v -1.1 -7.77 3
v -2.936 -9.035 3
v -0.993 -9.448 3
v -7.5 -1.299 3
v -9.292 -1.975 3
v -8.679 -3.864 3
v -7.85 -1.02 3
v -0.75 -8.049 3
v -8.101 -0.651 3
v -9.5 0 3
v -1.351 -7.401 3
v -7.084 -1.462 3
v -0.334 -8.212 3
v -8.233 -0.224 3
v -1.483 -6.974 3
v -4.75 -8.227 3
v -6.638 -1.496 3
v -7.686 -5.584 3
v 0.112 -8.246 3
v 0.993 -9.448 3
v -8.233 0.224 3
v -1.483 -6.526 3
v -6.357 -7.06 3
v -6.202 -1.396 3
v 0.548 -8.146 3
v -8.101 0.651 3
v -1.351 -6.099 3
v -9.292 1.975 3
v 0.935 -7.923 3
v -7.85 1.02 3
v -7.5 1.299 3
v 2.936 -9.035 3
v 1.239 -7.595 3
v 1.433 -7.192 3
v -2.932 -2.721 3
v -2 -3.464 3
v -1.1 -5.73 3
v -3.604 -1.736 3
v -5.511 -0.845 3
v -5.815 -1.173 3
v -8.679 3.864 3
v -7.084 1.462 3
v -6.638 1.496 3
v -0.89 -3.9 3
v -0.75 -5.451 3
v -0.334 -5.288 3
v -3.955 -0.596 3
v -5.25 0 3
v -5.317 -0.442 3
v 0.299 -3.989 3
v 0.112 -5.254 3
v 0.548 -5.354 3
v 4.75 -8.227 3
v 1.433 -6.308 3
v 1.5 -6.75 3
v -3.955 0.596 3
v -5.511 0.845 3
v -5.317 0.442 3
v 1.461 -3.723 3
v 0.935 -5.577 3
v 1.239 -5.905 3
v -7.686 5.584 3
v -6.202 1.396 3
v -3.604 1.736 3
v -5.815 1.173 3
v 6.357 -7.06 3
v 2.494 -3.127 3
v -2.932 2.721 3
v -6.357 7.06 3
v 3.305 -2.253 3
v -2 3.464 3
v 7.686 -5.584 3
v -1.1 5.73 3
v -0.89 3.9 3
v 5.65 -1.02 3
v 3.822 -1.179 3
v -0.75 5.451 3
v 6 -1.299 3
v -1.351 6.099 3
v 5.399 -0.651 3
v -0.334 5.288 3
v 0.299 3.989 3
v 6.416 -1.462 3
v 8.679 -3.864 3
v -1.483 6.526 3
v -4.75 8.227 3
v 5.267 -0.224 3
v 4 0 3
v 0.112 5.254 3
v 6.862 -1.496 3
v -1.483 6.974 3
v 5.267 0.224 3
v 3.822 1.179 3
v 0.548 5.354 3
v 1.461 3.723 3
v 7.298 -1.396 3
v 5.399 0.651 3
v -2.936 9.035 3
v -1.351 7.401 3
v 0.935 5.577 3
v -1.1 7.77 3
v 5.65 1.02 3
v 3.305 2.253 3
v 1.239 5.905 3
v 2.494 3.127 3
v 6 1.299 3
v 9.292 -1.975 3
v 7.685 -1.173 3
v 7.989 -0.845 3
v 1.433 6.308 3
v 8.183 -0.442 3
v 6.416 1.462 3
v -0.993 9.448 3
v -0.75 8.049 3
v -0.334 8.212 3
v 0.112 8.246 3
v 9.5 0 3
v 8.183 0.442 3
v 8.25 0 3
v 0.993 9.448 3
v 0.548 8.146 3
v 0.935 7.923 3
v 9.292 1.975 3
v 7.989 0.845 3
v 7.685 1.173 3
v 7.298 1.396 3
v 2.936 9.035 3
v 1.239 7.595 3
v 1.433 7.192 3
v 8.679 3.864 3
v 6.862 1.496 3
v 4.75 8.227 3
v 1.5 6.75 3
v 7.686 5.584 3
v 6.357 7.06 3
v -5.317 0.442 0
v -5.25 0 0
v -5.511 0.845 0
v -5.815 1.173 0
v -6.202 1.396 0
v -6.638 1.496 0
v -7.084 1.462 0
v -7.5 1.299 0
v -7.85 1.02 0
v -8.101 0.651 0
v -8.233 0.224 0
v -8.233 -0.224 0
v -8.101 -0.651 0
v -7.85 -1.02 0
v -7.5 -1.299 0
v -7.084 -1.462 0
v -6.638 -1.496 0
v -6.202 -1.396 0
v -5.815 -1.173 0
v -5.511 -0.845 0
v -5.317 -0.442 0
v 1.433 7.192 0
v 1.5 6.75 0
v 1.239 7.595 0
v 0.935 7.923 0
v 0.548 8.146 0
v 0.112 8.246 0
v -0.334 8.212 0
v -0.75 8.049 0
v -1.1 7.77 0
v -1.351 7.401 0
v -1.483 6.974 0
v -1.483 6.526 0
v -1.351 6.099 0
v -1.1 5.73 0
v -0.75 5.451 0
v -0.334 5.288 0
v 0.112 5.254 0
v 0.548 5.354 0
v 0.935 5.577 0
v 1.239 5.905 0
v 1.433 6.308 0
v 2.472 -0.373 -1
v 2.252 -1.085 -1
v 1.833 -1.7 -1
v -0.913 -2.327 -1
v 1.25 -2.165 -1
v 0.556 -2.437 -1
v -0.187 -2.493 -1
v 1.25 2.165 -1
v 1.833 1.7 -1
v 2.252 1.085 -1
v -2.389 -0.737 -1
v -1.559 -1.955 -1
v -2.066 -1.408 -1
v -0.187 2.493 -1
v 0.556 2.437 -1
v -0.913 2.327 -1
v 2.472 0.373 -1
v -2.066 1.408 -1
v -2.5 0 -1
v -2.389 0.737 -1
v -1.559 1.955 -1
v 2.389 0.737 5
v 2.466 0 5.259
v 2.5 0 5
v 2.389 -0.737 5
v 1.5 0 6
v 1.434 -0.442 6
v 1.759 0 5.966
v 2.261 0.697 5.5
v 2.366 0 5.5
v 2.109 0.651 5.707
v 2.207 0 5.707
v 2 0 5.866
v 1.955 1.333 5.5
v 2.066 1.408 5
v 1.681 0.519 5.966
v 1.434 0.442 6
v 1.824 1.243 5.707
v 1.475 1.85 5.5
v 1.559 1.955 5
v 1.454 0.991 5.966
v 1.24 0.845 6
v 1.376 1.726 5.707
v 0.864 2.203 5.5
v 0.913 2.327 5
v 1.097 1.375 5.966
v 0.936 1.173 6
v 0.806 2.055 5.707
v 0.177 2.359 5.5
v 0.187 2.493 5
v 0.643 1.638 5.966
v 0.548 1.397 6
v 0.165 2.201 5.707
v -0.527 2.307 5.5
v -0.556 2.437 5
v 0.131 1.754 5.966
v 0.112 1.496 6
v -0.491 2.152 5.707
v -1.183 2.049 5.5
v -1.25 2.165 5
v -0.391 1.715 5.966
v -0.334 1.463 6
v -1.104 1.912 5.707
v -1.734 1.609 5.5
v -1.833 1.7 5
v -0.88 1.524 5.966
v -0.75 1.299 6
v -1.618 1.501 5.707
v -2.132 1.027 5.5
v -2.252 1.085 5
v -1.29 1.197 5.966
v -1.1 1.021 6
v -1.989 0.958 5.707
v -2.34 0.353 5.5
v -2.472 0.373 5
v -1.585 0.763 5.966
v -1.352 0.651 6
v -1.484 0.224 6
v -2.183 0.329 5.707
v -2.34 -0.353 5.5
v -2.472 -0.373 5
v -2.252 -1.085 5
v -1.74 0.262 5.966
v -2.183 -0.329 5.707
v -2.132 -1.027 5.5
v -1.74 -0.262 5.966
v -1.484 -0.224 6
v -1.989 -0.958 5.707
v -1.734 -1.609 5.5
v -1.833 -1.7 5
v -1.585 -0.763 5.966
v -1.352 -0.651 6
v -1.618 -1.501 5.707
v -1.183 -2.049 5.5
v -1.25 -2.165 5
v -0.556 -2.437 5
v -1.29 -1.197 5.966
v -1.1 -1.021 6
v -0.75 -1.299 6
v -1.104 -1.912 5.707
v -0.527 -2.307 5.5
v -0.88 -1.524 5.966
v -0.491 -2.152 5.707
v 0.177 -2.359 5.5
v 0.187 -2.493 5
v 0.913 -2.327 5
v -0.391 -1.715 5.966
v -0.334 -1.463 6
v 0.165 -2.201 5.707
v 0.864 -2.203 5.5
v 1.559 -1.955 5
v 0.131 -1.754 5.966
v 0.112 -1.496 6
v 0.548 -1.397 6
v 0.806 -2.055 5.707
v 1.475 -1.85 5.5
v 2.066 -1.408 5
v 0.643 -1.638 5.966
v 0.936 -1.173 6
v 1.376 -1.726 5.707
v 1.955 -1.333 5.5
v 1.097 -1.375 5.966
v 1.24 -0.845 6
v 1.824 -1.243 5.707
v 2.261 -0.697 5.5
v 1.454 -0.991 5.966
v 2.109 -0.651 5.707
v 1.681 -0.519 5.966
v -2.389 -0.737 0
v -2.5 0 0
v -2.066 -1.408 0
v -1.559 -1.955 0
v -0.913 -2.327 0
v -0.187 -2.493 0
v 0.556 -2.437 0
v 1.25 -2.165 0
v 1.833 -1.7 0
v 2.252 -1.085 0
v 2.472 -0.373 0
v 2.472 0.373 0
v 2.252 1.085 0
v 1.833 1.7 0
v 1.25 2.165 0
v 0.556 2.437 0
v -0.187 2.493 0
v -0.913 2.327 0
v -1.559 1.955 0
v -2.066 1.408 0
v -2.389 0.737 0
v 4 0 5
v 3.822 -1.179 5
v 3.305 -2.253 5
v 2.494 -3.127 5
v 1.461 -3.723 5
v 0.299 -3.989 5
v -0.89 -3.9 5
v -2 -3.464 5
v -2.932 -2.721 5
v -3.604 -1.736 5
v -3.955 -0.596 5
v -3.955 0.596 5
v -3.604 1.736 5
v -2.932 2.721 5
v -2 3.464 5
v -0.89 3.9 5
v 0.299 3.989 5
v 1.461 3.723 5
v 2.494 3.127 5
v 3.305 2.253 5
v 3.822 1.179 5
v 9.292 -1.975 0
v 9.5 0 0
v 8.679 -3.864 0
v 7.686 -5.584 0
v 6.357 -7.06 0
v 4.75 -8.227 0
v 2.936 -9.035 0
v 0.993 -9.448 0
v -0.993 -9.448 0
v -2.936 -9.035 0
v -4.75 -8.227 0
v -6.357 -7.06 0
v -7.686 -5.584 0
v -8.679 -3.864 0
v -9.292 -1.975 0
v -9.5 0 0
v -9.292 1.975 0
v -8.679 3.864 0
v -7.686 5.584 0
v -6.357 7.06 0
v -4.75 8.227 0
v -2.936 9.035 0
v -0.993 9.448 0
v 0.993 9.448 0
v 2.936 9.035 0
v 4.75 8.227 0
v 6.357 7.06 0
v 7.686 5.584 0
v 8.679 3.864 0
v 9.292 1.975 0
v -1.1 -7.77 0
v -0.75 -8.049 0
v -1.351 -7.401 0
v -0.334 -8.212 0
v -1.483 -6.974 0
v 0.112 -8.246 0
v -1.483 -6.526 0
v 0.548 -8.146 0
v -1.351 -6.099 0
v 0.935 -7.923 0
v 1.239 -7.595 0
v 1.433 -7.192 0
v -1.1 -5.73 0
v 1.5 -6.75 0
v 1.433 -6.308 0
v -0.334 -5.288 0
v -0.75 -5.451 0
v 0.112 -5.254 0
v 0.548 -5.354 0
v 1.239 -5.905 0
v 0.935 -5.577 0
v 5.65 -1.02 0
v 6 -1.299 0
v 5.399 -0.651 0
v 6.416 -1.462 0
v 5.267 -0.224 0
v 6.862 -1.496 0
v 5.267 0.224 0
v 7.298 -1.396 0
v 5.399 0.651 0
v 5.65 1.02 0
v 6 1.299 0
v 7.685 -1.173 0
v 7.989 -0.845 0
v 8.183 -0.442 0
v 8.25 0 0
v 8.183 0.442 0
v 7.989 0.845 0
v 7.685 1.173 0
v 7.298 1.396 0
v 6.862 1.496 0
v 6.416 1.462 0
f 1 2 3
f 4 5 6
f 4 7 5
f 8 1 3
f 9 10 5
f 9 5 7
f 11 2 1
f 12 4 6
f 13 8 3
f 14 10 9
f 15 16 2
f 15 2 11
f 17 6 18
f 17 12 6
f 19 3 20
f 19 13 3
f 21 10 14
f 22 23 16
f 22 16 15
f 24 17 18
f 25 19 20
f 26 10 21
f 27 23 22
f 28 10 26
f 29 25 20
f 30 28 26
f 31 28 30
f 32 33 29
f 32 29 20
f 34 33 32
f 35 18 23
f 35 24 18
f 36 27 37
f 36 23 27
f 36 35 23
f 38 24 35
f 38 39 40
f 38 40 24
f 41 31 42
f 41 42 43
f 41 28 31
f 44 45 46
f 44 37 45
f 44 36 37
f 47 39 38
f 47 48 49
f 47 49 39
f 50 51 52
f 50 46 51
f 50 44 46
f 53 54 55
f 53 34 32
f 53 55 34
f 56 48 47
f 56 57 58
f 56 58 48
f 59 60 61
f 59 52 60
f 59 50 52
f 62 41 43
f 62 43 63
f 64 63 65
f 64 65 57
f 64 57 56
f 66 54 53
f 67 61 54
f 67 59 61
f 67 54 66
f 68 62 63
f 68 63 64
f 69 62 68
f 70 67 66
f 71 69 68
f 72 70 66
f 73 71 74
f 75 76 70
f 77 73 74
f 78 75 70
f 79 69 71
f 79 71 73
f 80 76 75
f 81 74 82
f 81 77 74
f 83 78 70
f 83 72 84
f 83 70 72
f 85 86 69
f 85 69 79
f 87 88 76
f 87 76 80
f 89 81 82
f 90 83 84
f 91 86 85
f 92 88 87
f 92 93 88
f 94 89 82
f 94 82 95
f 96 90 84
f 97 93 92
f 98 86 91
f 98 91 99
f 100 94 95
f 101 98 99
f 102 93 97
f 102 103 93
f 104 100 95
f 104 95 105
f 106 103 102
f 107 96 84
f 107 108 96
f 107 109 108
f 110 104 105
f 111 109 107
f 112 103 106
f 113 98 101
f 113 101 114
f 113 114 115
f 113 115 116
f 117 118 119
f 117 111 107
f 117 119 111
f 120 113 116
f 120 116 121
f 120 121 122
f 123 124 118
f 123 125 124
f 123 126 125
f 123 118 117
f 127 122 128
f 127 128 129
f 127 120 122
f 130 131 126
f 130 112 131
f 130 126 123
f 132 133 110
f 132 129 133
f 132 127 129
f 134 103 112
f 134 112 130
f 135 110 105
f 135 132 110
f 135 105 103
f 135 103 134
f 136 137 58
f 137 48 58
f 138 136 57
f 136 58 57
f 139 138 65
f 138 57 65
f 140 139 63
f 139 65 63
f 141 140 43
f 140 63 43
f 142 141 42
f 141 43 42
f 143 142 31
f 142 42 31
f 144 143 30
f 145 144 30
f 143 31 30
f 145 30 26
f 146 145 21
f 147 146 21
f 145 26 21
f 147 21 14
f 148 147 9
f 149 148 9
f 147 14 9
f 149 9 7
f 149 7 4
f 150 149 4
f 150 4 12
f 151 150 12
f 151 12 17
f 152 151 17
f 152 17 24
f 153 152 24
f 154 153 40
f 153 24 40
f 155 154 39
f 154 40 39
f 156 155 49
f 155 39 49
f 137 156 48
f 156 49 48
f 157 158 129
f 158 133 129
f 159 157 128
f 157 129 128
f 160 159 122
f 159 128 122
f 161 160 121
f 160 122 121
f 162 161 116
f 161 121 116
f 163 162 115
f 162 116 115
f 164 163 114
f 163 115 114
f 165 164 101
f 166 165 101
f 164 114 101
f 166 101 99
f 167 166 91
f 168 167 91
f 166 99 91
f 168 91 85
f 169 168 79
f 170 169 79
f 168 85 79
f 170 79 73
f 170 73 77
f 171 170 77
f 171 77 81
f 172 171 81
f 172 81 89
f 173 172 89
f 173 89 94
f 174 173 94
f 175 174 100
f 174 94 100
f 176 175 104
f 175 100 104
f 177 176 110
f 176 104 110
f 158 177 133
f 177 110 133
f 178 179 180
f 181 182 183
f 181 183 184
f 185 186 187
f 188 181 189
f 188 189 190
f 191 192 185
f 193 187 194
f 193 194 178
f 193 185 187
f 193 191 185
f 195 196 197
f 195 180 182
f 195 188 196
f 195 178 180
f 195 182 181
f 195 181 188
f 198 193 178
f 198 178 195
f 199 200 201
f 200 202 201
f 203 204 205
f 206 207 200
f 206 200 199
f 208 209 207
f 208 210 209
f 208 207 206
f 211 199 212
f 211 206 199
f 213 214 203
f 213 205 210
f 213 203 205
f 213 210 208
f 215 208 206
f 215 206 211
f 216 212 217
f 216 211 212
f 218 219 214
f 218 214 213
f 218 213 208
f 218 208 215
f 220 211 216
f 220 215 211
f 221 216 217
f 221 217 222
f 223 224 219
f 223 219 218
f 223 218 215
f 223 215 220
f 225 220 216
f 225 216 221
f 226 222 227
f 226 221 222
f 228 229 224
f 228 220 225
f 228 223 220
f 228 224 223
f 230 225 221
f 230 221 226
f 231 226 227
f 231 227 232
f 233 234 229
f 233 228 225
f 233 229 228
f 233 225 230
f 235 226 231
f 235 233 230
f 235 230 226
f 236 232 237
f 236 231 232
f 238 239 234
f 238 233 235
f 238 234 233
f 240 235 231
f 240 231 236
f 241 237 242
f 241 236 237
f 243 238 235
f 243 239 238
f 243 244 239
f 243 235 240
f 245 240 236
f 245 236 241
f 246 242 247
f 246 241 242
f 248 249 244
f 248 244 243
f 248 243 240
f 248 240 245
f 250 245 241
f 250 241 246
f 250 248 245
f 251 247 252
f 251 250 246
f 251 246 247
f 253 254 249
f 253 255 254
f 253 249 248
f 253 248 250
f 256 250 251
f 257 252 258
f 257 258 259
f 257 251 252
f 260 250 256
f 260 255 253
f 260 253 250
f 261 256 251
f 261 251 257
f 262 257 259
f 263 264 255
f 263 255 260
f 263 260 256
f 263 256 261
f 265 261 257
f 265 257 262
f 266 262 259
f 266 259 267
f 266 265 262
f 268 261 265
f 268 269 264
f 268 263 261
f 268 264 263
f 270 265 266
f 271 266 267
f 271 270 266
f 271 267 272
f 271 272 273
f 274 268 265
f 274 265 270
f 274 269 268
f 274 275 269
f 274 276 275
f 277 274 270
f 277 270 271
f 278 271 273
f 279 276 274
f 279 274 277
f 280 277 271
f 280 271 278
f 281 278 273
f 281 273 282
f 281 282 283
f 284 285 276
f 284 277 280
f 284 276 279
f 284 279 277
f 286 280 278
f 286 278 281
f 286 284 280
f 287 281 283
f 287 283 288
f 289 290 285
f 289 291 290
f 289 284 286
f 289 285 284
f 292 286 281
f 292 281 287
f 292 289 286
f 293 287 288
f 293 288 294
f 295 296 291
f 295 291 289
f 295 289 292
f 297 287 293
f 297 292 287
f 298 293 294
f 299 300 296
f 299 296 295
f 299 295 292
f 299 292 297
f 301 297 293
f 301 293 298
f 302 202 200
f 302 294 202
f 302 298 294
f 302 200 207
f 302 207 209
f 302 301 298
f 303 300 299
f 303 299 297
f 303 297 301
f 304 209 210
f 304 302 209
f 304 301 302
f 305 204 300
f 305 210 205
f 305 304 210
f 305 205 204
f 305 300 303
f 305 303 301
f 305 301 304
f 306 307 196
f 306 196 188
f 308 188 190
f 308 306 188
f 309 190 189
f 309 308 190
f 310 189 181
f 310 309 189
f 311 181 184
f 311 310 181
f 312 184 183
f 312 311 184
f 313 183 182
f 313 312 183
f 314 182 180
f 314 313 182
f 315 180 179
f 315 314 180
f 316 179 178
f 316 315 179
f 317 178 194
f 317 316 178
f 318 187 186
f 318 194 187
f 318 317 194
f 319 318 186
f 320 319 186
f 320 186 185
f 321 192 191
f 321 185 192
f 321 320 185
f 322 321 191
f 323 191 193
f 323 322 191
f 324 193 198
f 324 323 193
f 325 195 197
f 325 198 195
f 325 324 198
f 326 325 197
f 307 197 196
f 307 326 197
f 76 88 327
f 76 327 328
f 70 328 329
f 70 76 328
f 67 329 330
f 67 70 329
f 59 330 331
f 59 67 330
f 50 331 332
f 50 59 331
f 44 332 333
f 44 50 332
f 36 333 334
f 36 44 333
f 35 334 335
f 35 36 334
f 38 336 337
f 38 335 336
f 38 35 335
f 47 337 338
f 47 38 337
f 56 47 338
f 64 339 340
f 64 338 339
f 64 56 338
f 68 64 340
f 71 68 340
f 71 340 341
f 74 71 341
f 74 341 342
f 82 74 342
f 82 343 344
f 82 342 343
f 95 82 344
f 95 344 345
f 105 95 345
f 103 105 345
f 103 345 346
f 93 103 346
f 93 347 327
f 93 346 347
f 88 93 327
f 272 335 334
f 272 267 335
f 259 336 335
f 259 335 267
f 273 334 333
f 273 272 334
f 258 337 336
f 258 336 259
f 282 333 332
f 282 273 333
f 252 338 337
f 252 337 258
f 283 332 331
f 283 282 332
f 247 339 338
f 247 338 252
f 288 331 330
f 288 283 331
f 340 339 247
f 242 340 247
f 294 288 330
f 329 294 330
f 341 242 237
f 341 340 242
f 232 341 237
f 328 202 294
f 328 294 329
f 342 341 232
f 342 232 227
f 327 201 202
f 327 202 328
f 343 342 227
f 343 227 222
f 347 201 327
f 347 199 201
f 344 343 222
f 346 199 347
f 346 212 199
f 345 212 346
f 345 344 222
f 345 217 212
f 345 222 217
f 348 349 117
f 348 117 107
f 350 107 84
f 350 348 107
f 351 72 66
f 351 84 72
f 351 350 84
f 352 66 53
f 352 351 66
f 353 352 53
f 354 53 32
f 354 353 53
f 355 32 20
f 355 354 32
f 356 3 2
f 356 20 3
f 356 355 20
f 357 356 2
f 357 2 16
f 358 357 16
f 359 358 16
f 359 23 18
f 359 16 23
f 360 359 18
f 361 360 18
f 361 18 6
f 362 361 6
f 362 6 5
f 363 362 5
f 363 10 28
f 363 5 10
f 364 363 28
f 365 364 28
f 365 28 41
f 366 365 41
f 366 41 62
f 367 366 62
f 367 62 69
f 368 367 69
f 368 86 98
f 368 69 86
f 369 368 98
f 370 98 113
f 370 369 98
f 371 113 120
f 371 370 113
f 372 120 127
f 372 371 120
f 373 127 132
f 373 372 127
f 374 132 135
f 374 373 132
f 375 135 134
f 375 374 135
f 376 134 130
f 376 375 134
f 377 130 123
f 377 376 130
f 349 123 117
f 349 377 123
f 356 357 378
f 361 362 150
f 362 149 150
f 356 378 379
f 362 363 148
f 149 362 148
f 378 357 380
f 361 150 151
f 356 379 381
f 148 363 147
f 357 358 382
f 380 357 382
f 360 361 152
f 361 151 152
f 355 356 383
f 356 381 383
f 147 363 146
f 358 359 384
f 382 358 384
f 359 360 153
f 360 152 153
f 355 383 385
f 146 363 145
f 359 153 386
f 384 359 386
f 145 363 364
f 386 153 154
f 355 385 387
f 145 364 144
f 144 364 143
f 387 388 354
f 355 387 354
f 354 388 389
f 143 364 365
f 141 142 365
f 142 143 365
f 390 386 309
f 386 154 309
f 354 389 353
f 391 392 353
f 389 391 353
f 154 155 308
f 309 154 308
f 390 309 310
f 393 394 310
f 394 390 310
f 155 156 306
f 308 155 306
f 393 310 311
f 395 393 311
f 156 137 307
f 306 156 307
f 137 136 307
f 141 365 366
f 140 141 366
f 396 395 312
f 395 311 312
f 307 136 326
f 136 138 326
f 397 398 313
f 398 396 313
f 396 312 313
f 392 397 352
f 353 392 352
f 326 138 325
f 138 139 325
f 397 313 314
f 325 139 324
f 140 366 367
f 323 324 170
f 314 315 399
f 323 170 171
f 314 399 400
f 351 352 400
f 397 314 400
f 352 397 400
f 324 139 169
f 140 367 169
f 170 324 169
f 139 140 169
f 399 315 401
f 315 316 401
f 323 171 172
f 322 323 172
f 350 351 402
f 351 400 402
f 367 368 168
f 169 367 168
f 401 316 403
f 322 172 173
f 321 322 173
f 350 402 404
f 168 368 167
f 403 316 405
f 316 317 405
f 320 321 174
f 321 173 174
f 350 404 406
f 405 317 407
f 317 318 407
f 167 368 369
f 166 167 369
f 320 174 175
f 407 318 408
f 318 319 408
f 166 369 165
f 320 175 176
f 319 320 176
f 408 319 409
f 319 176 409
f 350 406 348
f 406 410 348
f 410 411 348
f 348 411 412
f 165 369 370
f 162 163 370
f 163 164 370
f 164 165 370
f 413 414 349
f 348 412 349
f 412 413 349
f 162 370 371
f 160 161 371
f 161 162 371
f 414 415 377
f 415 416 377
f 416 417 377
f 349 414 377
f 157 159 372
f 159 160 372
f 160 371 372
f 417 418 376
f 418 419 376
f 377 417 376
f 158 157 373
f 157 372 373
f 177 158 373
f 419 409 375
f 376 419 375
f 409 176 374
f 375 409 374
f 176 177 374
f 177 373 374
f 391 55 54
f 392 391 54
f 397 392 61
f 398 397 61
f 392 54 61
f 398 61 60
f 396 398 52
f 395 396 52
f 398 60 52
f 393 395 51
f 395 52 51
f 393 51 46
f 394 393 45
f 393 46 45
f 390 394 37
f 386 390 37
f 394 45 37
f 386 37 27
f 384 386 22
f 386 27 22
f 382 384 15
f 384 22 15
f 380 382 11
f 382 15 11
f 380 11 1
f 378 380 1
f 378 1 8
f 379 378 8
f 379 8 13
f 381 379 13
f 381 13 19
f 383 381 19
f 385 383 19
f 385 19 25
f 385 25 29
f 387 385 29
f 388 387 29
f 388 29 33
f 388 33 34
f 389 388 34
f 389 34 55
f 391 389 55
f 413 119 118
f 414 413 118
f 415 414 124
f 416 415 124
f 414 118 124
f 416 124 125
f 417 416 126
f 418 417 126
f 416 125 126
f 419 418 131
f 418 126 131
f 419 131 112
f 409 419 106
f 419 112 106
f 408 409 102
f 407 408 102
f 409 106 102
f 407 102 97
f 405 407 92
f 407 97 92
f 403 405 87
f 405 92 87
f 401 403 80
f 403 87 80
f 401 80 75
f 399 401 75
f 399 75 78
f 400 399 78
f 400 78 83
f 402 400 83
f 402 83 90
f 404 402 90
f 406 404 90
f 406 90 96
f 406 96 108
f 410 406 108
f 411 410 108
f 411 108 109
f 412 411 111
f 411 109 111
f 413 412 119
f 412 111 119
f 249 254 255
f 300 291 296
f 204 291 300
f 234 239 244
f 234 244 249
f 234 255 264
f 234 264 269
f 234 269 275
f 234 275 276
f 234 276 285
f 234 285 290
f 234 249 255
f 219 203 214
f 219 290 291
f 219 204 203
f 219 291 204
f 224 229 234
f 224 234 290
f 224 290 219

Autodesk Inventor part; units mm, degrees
ref_plane "YZ Plane" through (0, 0, 0) normal (1, 0, 0) x (0, 1, 0)
ref_plane "XZ Plane" through (0, 0, 0) normal (0, 1, 0) x (-1, 0, 0)
ref_plane "XY Plane" through (0, 0, 0) normal (0, 0, 1) x (1, 0, 0)
sketch "Sketch1" plane through (0, 0, 0) normal (0, 0, 1) x (1, 0, 0)
  circle A0 centre (0, 0) radius 9.5
  dimension "d0" = 19
extrude "Extrusion1" add sketch "Sketch1" along normal blind 3
sketch "Sketch2" plane through (0, 0, 3) normal (0, 0, 1) x (1, 0, 0)
  circle A0 centre (0, 0) radius 9.5 projected
  circle A1 centre (0, 0) radius 4
  dimension "d3" = 8
extrude "Extrusion2" add sketch "Sketch2" along normal blind 2 contours A1
sketch "Sketch3" plane through (0, 0, 5) normal (0, 0, 1) x (1, 0, 0)
  circle A0 centre (0, 0) radius 4 projected
  circle A1 centre (0, 0) radius 2.5
  dimension "d6" = 5
extrude "Extrusion3" add sketch "Sketch3" along normal blind 1 contours A1
fillet "Fillet1" radius 1 1 edges at (-2.5, 0, 6)
sketch "Sketch4" plane through (0, 0, 3) normal (0, 0, 1) x (1, 0, 0)
  circle A0 centre (0, 0) radius 4 projected
  line L0 (0, 4) -> (0, 9.5)
  circle A1 centre (0, 0) radius 9.5 projected
  line L1 (-9.5, 0) -> (-4, 0)
  line L2 (-13.3, 0) -> (13.3, 0) construction
  line L3 (0, -13.3) -> (0, 13.3) construction
  circle A2 centre (0, 6.75) radius 1.5
  circle A3 centre (0, -6.75) radius 1.5
  circle A4 centre (-6.75, 0) radius 1.5
  circle A5 centre (6.75, 0) radius 1.5
  dimension "d10" = 3
extrude "Extrusion4" cut sketch "Sketch4" against normal through all contours A2 L0 | L0 A2 | A4 L1 | L1 A4 | A3 | A5
sketch "Sketch5" plane through (0, 0, 0) normal (0, 0, -1) x (-1, 0, 0)
  circle A0 centre (0, 0) radius 2.5 projected
extrude "Extrusion5" add sketch "Sketch5" along normal blind 1
properties part number "FeeTechSTS3025BL-Flange"
